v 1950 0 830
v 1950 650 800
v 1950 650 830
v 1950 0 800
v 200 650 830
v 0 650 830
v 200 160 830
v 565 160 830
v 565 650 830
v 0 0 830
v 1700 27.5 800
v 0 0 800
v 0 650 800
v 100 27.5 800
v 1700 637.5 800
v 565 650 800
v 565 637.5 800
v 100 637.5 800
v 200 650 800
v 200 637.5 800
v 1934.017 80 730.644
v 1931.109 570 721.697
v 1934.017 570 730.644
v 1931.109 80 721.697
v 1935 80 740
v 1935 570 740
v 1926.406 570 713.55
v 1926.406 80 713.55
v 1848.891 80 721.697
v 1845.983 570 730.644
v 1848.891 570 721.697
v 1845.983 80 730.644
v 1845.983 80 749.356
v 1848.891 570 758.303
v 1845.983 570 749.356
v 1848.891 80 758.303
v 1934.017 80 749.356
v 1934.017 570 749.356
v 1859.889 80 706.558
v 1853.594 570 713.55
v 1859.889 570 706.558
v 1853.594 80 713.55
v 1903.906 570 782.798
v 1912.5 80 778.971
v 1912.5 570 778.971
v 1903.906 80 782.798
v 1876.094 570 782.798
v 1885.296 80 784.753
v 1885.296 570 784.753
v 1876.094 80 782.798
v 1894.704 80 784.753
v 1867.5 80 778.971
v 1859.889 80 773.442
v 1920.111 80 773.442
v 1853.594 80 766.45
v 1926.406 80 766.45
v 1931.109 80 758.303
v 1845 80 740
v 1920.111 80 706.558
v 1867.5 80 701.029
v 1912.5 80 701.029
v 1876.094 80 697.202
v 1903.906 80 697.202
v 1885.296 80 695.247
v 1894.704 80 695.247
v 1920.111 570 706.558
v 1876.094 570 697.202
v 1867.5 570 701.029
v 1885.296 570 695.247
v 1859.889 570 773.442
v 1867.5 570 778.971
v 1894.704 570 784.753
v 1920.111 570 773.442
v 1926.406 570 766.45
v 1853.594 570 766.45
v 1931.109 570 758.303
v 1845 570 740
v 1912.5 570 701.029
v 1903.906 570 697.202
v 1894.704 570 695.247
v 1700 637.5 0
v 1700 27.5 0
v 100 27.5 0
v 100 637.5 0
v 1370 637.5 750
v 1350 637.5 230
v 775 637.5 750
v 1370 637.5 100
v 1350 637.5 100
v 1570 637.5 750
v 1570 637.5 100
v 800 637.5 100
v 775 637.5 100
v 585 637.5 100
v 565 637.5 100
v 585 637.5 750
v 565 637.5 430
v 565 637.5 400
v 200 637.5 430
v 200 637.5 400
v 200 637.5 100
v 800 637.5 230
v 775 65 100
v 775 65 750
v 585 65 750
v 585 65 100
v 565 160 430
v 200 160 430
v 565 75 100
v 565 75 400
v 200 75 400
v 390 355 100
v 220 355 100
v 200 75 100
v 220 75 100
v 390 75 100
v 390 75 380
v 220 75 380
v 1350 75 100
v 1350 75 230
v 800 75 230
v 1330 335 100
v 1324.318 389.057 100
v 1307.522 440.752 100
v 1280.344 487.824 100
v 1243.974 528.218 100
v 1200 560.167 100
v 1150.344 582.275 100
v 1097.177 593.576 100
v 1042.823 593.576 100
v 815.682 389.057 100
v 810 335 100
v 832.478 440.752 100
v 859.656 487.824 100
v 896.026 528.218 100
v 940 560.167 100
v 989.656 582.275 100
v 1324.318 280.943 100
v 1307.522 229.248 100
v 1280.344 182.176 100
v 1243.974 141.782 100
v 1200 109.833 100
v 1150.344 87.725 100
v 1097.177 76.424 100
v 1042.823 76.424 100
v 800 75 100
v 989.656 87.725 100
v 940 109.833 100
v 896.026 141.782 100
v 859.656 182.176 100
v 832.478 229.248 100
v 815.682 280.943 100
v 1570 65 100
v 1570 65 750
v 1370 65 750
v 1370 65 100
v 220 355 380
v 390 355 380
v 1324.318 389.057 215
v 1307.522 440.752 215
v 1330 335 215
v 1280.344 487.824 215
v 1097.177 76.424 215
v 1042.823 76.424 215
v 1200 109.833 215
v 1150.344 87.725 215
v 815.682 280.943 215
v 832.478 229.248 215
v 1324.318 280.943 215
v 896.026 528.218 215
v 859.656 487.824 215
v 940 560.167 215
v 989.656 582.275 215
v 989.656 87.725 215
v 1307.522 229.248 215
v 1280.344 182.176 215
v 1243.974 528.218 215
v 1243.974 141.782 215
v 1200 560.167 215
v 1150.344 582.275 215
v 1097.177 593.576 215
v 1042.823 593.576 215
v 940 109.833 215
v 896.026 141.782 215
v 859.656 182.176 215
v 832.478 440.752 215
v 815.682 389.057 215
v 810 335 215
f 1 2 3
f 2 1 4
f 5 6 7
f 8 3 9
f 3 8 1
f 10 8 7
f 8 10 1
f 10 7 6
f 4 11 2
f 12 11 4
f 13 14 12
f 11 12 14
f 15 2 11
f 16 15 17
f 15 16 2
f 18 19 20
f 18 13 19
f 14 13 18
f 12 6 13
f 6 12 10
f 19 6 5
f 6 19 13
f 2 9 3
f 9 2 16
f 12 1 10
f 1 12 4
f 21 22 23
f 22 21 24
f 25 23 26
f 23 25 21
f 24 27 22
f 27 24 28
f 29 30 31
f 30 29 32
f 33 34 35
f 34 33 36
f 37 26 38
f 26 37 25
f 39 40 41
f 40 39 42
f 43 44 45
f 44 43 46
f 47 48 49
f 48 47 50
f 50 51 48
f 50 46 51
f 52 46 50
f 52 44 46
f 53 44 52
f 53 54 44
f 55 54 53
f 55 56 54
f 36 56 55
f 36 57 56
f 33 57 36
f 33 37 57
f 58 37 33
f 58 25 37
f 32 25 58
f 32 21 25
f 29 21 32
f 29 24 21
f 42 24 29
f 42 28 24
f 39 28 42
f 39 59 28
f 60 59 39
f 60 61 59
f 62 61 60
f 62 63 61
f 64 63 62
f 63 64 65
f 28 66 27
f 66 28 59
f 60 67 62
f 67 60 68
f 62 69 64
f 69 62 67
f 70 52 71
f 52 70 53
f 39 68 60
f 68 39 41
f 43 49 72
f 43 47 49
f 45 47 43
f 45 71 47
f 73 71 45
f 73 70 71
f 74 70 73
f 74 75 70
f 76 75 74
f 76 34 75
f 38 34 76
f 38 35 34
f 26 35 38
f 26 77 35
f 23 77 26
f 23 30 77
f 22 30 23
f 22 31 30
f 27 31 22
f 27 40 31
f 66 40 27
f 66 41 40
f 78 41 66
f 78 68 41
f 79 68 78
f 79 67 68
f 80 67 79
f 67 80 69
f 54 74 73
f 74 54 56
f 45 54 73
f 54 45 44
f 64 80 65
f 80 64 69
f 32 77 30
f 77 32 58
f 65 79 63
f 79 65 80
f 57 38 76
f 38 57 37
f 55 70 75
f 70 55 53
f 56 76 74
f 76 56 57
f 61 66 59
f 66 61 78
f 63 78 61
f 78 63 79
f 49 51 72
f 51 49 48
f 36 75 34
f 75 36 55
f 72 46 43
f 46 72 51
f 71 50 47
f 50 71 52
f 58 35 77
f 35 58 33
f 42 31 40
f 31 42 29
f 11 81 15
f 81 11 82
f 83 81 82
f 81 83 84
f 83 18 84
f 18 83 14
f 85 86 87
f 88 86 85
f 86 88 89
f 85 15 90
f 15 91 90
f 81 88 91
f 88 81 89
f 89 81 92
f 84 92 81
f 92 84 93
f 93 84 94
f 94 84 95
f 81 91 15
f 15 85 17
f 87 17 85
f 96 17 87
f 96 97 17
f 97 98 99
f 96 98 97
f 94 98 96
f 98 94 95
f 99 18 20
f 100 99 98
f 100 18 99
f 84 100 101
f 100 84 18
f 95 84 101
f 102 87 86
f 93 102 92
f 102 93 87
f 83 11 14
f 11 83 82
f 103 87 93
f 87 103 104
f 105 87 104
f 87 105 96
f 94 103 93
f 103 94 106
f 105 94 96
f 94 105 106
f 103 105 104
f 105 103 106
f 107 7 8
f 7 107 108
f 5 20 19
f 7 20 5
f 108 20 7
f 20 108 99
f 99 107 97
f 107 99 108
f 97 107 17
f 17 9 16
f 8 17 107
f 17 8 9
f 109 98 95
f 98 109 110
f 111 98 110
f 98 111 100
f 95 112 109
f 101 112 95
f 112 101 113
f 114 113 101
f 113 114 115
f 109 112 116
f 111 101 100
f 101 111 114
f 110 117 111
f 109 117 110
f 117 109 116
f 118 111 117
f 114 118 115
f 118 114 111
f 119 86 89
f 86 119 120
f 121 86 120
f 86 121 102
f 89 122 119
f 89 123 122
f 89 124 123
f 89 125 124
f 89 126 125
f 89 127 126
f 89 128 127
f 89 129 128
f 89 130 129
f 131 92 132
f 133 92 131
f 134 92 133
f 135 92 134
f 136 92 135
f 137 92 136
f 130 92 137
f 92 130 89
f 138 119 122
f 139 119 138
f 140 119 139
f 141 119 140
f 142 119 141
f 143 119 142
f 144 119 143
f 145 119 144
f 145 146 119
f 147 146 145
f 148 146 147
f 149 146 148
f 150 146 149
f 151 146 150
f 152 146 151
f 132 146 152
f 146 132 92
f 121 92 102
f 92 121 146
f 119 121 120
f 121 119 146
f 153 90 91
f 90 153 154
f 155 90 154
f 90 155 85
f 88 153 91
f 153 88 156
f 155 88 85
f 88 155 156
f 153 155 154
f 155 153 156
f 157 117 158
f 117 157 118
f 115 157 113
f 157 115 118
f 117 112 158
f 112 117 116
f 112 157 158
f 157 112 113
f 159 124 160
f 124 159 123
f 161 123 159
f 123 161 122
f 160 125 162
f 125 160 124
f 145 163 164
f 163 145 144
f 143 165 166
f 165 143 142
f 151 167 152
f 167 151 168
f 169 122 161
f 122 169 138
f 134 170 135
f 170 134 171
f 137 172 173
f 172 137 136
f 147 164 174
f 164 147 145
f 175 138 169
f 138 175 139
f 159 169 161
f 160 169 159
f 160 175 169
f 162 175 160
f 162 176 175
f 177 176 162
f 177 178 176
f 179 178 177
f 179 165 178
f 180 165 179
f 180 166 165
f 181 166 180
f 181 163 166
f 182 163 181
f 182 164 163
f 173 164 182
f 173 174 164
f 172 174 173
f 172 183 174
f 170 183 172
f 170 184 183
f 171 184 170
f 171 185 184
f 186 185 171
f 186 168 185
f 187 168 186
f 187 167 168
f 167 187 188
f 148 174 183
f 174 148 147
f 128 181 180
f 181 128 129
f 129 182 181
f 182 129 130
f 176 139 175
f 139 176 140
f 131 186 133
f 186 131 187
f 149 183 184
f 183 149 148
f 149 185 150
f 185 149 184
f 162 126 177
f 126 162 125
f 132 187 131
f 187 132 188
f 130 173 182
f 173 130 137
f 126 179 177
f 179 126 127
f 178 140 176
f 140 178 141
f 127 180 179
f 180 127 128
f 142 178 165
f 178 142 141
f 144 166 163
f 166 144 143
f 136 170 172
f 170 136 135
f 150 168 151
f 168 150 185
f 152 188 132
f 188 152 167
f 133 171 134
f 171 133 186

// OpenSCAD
// A tömbök elemei: szélesség, mélység, magasság
munkalap = [1950, 650, 30]; 
tarolo = [1600, 610, 800];
fiok_elolap_v = 15;
korpusz_eltolas = (munkalap[1]-tarolo[1]-fiok_elolap_v)/2+fiok_elolap_v;
difference(){
    union(){
        translate([0,0,800])cube(munkalap); // asztallap
        translate([munkalap[0]-60, (munkalap[1]-490)/2, 800-60]) rotate([-90,0,0])alufolia();
        translate([100,korpusz_eltolas,0])cube(tarolo); // Pakoló rész egy tömegben. Szándékosan aszimetrikus. A 800mm alacsony lesz. Még ki kell találni mennyi legyen
    }    
    translate([200+385,65,100])faszen();
    translate([200+385,373,100])faszen();
    translate([200+365,160,430])rotate(90)translate([])hutotaska_helyenek();
    translate([200,75,100])cube([365,600,300]); // Alsó pakoló. Ide beférhet még a tárcsa, gázégő (ez akár lóghat is valahol, tárcsa, bogrács
    translate([1000-200,75,100])cube([550, 620,130]); // Vágódeszka helye.  TODO: fiókot neki, hogy ne piszkolódjon.
    #translate([1600-230,65,100])cube([200, 620, 650]); // Inkább fiókos irányban
}
translate([200+170+20, 75,100])rotate(90)faszengyujtokemeny();
translate([1070,260+75,100])vagodeszka(); 
// Mellette elférhet a sütőlap, a bogrács, gázégőfej, 
// fakanál hosszában az asztallap alatt


module alufolia(){
    //cube([490, 140, 90]);
    cylinder(r = 45, h = 490);
}

module vagodeszka(){
    cylinder(r=260, h= 115);
}

module homero6os(){
    cube([200,140,55]);
}

module gumikesztyu(){
    cube([220, 120, 60]);
}

module landliebe(){
    cylinder(r=43, h=125);
}

module kotanyiuveg(){
    cylinder(r=25, h=150);
}

module faszengyujto(){
    cube([205, 70,45]);
}

module faszengyujtokemeny(){
    //cylinder(r=125, h=280);
    cube([280, 170, 280]);
}

module faforgacsosdobos(){
    cube([210, 230, 75]);
}

module hutotaska(){
    cube([420, 285, 380]);
}

module hutotaska_helyenek(){
    cube([500, 365, 430]);  // széltében és hosszában 4 centivel nagyobb oldalanként mint a táska és 5cm-rel magasabb
}

module faszen(){
    cube([190, 310, 650]); // Az eredeti szélesség és mélység + 2 centi a kényelmes pakoláshoz
}
